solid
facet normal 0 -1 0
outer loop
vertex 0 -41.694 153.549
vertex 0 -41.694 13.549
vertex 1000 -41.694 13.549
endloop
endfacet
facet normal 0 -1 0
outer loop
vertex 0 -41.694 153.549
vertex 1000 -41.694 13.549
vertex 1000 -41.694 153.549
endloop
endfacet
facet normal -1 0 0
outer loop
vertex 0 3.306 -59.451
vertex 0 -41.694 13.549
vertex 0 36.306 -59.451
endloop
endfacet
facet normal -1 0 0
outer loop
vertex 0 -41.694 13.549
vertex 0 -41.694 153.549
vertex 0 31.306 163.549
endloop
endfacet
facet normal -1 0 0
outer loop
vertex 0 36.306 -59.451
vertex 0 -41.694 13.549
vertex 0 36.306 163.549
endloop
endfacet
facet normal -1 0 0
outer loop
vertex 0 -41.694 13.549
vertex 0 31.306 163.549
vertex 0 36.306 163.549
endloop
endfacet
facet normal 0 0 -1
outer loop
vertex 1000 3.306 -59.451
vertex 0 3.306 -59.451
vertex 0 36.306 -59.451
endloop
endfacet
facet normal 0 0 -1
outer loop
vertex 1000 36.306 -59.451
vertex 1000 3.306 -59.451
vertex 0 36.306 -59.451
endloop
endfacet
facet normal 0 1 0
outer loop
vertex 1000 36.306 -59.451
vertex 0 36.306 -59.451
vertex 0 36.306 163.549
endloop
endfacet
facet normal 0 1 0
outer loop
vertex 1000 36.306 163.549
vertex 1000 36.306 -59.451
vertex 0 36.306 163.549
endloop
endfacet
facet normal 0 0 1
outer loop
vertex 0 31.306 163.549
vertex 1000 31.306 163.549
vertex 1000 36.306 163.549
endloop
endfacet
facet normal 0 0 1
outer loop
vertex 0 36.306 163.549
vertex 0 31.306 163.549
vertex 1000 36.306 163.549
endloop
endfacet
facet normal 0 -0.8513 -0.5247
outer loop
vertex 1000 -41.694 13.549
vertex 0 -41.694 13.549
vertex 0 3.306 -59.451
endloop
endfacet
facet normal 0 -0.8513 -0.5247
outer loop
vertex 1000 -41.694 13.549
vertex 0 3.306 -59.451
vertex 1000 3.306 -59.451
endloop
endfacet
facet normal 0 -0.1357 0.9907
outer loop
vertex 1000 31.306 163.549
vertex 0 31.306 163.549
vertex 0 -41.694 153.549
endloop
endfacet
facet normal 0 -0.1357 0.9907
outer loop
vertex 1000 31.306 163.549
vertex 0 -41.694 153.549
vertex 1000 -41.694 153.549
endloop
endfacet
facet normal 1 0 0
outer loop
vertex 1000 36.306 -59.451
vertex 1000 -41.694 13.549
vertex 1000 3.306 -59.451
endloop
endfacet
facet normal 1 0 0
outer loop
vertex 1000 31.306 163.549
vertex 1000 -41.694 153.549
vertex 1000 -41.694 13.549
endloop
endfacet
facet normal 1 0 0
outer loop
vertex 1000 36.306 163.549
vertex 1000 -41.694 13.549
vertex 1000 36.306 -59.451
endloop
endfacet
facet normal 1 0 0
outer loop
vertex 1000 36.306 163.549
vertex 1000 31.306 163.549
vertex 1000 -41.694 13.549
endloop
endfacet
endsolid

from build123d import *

# Parameters (mm, degrees)
F0_W     = 78
F0_H     = 223
F1_DEPTH = 1000
F2_SIZE2 = 73
F2_SIZE  = 10
F3_SIZE2 = 73
F3_SIZE  = 45


with BuildPart() as f1:
    # F0 (on Right) → F1 (new body)
    with BuildSketch(Plane.YZ):
        with Locations((-2.6943162084, 52.0490169225)):
            Rectangle(F0_W, F0_H)
    extrude(amount=F1_DEPTH)

    # F2
    f2_edges = [f1.edges().sort_by_distance(p)[0] for p in [
        (500, -41.694316, 163.549017),
    ]]
    f2_side = f1.faces().sort_by_distance((500, -41.694316, 52.049017))[0]
    chamfer(f2_edges, length=F2_SIZE, length2=F2_SIZE2, reference=f2_side)

    # F3
    f3_edges = [f1.edges().sort_by_distance(p)[0] for p in [
        (500, -41.694316, -59.450983),
    ]]
    f3_side = f1.faces().sort_by_distance((500, -2.694316, -59.450983))[0]
    chamfer(f3_edges, length=F3_SIZE, length2=F3_SIZE2, reference=f3_side)


solid = f1.part
